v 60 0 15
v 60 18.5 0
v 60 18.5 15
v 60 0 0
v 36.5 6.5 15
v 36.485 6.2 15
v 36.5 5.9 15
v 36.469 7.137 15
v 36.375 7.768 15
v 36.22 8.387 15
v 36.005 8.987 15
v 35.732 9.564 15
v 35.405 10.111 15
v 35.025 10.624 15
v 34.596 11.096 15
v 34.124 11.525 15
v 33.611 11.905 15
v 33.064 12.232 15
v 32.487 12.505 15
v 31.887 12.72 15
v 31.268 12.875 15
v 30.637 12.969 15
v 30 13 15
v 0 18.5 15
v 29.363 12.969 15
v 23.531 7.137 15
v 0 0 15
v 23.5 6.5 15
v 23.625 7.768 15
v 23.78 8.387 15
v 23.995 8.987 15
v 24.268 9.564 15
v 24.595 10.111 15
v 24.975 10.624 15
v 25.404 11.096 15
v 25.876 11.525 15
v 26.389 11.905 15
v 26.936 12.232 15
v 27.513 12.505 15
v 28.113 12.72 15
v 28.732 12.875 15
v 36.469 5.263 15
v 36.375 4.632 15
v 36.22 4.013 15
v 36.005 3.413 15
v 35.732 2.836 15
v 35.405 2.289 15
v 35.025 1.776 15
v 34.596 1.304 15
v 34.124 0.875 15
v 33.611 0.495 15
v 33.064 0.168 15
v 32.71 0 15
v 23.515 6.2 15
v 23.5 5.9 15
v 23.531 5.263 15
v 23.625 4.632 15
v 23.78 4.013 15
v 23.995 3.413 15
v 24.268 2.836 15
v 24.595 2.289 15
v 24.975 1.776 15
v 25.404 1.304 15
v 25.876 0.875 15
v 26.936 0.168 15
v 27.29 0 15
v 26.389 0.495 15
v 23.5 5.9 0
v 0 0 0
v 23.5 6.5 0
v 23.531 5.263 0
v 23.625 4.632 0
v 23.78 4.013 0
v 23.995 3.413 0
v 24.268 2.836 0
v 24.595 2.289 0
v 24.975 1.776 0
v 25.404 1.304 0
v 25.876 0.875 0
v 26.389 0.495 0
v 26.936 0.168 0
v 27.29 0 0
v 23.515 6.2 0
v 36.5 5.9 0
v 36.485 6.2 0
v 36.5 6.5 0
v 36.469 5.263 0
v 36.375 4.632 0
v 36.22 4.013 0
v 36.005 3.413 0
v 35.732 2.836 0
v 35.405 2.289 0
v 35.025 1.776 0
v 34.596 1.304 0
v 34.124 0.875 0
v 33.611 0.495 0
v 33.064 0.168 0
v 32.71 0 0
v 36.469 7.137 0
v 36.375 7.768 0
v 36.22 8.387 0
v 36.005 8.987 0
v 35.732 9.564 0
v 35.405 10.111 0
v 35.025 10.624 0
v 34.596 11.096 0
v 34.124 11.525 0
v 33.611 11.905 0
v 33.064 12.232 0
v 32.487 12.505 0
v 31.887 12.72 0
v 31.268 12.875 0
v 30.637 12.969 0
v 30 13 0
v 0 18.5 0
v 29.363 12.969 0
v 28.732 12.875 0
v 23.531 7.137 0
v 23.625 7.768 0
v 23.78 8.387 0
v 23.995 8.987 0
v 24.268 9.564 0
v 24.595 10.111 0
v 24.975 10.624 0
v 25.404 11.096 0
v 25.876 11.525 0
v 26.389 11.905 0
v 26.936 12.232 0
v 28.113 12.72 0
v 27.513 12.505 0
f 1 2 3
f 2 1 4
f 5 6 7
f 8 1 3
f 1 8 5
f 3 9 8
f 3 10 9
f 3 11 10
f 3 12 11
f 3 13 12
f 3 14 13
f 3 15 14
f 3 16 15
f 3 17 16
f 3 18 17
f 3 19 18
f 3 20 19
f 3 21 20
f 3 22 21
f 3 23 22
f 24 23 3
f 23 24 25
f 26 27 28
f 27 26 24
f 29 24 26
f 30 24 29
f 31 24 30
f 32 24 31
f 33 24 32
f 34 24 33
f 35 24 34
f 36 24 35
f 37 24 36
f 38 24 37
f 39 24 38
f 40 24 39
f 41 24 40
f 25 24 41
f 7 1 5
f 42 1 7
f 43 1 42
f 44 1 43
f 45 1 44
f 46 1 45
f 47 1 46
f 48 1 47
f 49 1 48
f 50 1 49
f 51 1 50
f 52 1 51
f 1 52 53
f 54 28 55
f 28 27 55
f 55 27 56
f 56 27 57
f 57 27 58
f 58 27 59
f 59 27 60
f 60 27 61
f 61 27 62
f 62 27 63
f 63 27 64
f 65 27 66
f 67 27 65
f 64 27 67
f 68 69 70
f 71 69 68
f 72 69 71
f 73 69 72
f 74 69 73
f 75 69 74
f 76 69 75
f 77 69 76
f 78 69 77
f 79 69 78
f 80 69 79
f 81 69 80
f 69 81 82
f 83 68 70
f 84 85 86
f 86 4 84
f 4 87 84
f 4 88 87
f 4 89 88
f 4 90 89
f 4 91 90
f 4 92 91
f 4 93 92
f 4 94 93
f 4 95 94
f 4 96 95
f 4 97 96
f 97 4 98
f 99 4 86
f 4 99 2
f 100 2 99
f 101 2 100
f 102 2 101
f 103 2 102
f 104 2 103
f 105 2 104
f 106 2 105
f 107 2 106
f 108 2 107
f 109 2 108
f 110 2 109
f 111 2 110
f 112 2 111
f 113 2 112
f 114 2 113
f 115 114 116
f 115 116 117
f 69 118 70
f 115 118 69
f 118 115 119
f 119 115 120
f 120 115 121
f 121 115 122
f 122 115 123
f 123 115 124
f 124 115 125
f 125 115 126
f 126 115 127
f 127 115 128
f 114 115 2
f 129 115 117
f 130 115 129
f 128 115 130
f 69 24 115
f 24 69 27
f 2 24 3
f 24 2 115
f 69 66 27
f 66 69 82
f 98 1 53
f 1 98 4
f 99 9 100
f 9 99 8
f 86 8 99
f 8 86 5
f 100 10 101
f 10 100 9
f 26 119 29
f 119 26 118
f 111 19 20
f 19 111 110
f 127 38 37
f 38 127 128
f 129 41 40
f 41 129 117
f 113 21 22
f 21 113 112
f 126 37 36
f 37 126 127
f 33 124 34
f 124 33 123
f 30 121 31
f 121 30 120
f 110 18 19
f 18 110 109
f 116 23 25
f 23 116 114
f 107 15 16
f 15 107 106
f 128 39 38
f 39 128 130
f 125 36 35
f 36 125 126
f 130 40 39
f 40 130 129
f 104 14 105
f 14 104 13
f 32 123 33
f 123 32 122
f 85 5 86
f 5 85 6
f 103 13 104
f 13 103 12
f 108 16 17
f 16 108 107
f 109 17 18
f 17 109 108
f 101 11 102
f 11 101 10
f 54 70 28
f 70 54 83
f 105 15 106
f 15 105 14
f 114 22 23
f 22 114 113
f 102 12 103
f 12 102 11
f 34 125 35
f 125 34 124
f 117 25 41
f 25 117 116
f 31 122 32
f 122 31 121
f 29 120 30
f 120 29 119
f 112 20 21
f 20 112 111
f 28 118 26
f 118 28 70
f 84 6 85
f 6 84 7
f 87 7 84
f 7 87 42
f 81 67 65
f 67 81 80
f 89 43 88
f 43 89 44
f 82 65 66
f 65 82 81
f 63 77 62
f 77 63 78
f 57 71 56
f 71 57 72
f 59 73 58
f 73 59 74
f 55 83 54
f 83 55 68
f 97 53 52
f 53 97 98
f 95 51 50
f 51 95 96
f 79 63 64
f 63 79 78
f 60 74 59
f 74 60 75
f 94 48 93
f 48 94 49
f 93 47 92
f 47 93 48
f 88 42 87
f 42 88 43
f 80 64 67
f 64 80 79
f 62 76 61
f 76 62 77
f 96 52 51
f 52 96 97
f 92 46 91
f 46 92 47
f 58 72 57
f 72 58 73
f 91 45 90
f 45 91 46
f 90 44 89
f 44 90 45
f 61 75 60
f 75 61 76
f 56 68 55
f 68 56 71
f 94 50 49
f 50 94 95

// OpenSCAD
$fn=64;
w=60;
l=18.5;
h=15;
d=13;

difference(){
    cube([w,l,h]);
    #translate([w/2,+d/2,-0.05])
       cylinder(d=d,h=h+0.1);
    #translate([w/2,+d/2-0.6,-0.05])
       cylinder(d=d,h=h+0.1);
}
